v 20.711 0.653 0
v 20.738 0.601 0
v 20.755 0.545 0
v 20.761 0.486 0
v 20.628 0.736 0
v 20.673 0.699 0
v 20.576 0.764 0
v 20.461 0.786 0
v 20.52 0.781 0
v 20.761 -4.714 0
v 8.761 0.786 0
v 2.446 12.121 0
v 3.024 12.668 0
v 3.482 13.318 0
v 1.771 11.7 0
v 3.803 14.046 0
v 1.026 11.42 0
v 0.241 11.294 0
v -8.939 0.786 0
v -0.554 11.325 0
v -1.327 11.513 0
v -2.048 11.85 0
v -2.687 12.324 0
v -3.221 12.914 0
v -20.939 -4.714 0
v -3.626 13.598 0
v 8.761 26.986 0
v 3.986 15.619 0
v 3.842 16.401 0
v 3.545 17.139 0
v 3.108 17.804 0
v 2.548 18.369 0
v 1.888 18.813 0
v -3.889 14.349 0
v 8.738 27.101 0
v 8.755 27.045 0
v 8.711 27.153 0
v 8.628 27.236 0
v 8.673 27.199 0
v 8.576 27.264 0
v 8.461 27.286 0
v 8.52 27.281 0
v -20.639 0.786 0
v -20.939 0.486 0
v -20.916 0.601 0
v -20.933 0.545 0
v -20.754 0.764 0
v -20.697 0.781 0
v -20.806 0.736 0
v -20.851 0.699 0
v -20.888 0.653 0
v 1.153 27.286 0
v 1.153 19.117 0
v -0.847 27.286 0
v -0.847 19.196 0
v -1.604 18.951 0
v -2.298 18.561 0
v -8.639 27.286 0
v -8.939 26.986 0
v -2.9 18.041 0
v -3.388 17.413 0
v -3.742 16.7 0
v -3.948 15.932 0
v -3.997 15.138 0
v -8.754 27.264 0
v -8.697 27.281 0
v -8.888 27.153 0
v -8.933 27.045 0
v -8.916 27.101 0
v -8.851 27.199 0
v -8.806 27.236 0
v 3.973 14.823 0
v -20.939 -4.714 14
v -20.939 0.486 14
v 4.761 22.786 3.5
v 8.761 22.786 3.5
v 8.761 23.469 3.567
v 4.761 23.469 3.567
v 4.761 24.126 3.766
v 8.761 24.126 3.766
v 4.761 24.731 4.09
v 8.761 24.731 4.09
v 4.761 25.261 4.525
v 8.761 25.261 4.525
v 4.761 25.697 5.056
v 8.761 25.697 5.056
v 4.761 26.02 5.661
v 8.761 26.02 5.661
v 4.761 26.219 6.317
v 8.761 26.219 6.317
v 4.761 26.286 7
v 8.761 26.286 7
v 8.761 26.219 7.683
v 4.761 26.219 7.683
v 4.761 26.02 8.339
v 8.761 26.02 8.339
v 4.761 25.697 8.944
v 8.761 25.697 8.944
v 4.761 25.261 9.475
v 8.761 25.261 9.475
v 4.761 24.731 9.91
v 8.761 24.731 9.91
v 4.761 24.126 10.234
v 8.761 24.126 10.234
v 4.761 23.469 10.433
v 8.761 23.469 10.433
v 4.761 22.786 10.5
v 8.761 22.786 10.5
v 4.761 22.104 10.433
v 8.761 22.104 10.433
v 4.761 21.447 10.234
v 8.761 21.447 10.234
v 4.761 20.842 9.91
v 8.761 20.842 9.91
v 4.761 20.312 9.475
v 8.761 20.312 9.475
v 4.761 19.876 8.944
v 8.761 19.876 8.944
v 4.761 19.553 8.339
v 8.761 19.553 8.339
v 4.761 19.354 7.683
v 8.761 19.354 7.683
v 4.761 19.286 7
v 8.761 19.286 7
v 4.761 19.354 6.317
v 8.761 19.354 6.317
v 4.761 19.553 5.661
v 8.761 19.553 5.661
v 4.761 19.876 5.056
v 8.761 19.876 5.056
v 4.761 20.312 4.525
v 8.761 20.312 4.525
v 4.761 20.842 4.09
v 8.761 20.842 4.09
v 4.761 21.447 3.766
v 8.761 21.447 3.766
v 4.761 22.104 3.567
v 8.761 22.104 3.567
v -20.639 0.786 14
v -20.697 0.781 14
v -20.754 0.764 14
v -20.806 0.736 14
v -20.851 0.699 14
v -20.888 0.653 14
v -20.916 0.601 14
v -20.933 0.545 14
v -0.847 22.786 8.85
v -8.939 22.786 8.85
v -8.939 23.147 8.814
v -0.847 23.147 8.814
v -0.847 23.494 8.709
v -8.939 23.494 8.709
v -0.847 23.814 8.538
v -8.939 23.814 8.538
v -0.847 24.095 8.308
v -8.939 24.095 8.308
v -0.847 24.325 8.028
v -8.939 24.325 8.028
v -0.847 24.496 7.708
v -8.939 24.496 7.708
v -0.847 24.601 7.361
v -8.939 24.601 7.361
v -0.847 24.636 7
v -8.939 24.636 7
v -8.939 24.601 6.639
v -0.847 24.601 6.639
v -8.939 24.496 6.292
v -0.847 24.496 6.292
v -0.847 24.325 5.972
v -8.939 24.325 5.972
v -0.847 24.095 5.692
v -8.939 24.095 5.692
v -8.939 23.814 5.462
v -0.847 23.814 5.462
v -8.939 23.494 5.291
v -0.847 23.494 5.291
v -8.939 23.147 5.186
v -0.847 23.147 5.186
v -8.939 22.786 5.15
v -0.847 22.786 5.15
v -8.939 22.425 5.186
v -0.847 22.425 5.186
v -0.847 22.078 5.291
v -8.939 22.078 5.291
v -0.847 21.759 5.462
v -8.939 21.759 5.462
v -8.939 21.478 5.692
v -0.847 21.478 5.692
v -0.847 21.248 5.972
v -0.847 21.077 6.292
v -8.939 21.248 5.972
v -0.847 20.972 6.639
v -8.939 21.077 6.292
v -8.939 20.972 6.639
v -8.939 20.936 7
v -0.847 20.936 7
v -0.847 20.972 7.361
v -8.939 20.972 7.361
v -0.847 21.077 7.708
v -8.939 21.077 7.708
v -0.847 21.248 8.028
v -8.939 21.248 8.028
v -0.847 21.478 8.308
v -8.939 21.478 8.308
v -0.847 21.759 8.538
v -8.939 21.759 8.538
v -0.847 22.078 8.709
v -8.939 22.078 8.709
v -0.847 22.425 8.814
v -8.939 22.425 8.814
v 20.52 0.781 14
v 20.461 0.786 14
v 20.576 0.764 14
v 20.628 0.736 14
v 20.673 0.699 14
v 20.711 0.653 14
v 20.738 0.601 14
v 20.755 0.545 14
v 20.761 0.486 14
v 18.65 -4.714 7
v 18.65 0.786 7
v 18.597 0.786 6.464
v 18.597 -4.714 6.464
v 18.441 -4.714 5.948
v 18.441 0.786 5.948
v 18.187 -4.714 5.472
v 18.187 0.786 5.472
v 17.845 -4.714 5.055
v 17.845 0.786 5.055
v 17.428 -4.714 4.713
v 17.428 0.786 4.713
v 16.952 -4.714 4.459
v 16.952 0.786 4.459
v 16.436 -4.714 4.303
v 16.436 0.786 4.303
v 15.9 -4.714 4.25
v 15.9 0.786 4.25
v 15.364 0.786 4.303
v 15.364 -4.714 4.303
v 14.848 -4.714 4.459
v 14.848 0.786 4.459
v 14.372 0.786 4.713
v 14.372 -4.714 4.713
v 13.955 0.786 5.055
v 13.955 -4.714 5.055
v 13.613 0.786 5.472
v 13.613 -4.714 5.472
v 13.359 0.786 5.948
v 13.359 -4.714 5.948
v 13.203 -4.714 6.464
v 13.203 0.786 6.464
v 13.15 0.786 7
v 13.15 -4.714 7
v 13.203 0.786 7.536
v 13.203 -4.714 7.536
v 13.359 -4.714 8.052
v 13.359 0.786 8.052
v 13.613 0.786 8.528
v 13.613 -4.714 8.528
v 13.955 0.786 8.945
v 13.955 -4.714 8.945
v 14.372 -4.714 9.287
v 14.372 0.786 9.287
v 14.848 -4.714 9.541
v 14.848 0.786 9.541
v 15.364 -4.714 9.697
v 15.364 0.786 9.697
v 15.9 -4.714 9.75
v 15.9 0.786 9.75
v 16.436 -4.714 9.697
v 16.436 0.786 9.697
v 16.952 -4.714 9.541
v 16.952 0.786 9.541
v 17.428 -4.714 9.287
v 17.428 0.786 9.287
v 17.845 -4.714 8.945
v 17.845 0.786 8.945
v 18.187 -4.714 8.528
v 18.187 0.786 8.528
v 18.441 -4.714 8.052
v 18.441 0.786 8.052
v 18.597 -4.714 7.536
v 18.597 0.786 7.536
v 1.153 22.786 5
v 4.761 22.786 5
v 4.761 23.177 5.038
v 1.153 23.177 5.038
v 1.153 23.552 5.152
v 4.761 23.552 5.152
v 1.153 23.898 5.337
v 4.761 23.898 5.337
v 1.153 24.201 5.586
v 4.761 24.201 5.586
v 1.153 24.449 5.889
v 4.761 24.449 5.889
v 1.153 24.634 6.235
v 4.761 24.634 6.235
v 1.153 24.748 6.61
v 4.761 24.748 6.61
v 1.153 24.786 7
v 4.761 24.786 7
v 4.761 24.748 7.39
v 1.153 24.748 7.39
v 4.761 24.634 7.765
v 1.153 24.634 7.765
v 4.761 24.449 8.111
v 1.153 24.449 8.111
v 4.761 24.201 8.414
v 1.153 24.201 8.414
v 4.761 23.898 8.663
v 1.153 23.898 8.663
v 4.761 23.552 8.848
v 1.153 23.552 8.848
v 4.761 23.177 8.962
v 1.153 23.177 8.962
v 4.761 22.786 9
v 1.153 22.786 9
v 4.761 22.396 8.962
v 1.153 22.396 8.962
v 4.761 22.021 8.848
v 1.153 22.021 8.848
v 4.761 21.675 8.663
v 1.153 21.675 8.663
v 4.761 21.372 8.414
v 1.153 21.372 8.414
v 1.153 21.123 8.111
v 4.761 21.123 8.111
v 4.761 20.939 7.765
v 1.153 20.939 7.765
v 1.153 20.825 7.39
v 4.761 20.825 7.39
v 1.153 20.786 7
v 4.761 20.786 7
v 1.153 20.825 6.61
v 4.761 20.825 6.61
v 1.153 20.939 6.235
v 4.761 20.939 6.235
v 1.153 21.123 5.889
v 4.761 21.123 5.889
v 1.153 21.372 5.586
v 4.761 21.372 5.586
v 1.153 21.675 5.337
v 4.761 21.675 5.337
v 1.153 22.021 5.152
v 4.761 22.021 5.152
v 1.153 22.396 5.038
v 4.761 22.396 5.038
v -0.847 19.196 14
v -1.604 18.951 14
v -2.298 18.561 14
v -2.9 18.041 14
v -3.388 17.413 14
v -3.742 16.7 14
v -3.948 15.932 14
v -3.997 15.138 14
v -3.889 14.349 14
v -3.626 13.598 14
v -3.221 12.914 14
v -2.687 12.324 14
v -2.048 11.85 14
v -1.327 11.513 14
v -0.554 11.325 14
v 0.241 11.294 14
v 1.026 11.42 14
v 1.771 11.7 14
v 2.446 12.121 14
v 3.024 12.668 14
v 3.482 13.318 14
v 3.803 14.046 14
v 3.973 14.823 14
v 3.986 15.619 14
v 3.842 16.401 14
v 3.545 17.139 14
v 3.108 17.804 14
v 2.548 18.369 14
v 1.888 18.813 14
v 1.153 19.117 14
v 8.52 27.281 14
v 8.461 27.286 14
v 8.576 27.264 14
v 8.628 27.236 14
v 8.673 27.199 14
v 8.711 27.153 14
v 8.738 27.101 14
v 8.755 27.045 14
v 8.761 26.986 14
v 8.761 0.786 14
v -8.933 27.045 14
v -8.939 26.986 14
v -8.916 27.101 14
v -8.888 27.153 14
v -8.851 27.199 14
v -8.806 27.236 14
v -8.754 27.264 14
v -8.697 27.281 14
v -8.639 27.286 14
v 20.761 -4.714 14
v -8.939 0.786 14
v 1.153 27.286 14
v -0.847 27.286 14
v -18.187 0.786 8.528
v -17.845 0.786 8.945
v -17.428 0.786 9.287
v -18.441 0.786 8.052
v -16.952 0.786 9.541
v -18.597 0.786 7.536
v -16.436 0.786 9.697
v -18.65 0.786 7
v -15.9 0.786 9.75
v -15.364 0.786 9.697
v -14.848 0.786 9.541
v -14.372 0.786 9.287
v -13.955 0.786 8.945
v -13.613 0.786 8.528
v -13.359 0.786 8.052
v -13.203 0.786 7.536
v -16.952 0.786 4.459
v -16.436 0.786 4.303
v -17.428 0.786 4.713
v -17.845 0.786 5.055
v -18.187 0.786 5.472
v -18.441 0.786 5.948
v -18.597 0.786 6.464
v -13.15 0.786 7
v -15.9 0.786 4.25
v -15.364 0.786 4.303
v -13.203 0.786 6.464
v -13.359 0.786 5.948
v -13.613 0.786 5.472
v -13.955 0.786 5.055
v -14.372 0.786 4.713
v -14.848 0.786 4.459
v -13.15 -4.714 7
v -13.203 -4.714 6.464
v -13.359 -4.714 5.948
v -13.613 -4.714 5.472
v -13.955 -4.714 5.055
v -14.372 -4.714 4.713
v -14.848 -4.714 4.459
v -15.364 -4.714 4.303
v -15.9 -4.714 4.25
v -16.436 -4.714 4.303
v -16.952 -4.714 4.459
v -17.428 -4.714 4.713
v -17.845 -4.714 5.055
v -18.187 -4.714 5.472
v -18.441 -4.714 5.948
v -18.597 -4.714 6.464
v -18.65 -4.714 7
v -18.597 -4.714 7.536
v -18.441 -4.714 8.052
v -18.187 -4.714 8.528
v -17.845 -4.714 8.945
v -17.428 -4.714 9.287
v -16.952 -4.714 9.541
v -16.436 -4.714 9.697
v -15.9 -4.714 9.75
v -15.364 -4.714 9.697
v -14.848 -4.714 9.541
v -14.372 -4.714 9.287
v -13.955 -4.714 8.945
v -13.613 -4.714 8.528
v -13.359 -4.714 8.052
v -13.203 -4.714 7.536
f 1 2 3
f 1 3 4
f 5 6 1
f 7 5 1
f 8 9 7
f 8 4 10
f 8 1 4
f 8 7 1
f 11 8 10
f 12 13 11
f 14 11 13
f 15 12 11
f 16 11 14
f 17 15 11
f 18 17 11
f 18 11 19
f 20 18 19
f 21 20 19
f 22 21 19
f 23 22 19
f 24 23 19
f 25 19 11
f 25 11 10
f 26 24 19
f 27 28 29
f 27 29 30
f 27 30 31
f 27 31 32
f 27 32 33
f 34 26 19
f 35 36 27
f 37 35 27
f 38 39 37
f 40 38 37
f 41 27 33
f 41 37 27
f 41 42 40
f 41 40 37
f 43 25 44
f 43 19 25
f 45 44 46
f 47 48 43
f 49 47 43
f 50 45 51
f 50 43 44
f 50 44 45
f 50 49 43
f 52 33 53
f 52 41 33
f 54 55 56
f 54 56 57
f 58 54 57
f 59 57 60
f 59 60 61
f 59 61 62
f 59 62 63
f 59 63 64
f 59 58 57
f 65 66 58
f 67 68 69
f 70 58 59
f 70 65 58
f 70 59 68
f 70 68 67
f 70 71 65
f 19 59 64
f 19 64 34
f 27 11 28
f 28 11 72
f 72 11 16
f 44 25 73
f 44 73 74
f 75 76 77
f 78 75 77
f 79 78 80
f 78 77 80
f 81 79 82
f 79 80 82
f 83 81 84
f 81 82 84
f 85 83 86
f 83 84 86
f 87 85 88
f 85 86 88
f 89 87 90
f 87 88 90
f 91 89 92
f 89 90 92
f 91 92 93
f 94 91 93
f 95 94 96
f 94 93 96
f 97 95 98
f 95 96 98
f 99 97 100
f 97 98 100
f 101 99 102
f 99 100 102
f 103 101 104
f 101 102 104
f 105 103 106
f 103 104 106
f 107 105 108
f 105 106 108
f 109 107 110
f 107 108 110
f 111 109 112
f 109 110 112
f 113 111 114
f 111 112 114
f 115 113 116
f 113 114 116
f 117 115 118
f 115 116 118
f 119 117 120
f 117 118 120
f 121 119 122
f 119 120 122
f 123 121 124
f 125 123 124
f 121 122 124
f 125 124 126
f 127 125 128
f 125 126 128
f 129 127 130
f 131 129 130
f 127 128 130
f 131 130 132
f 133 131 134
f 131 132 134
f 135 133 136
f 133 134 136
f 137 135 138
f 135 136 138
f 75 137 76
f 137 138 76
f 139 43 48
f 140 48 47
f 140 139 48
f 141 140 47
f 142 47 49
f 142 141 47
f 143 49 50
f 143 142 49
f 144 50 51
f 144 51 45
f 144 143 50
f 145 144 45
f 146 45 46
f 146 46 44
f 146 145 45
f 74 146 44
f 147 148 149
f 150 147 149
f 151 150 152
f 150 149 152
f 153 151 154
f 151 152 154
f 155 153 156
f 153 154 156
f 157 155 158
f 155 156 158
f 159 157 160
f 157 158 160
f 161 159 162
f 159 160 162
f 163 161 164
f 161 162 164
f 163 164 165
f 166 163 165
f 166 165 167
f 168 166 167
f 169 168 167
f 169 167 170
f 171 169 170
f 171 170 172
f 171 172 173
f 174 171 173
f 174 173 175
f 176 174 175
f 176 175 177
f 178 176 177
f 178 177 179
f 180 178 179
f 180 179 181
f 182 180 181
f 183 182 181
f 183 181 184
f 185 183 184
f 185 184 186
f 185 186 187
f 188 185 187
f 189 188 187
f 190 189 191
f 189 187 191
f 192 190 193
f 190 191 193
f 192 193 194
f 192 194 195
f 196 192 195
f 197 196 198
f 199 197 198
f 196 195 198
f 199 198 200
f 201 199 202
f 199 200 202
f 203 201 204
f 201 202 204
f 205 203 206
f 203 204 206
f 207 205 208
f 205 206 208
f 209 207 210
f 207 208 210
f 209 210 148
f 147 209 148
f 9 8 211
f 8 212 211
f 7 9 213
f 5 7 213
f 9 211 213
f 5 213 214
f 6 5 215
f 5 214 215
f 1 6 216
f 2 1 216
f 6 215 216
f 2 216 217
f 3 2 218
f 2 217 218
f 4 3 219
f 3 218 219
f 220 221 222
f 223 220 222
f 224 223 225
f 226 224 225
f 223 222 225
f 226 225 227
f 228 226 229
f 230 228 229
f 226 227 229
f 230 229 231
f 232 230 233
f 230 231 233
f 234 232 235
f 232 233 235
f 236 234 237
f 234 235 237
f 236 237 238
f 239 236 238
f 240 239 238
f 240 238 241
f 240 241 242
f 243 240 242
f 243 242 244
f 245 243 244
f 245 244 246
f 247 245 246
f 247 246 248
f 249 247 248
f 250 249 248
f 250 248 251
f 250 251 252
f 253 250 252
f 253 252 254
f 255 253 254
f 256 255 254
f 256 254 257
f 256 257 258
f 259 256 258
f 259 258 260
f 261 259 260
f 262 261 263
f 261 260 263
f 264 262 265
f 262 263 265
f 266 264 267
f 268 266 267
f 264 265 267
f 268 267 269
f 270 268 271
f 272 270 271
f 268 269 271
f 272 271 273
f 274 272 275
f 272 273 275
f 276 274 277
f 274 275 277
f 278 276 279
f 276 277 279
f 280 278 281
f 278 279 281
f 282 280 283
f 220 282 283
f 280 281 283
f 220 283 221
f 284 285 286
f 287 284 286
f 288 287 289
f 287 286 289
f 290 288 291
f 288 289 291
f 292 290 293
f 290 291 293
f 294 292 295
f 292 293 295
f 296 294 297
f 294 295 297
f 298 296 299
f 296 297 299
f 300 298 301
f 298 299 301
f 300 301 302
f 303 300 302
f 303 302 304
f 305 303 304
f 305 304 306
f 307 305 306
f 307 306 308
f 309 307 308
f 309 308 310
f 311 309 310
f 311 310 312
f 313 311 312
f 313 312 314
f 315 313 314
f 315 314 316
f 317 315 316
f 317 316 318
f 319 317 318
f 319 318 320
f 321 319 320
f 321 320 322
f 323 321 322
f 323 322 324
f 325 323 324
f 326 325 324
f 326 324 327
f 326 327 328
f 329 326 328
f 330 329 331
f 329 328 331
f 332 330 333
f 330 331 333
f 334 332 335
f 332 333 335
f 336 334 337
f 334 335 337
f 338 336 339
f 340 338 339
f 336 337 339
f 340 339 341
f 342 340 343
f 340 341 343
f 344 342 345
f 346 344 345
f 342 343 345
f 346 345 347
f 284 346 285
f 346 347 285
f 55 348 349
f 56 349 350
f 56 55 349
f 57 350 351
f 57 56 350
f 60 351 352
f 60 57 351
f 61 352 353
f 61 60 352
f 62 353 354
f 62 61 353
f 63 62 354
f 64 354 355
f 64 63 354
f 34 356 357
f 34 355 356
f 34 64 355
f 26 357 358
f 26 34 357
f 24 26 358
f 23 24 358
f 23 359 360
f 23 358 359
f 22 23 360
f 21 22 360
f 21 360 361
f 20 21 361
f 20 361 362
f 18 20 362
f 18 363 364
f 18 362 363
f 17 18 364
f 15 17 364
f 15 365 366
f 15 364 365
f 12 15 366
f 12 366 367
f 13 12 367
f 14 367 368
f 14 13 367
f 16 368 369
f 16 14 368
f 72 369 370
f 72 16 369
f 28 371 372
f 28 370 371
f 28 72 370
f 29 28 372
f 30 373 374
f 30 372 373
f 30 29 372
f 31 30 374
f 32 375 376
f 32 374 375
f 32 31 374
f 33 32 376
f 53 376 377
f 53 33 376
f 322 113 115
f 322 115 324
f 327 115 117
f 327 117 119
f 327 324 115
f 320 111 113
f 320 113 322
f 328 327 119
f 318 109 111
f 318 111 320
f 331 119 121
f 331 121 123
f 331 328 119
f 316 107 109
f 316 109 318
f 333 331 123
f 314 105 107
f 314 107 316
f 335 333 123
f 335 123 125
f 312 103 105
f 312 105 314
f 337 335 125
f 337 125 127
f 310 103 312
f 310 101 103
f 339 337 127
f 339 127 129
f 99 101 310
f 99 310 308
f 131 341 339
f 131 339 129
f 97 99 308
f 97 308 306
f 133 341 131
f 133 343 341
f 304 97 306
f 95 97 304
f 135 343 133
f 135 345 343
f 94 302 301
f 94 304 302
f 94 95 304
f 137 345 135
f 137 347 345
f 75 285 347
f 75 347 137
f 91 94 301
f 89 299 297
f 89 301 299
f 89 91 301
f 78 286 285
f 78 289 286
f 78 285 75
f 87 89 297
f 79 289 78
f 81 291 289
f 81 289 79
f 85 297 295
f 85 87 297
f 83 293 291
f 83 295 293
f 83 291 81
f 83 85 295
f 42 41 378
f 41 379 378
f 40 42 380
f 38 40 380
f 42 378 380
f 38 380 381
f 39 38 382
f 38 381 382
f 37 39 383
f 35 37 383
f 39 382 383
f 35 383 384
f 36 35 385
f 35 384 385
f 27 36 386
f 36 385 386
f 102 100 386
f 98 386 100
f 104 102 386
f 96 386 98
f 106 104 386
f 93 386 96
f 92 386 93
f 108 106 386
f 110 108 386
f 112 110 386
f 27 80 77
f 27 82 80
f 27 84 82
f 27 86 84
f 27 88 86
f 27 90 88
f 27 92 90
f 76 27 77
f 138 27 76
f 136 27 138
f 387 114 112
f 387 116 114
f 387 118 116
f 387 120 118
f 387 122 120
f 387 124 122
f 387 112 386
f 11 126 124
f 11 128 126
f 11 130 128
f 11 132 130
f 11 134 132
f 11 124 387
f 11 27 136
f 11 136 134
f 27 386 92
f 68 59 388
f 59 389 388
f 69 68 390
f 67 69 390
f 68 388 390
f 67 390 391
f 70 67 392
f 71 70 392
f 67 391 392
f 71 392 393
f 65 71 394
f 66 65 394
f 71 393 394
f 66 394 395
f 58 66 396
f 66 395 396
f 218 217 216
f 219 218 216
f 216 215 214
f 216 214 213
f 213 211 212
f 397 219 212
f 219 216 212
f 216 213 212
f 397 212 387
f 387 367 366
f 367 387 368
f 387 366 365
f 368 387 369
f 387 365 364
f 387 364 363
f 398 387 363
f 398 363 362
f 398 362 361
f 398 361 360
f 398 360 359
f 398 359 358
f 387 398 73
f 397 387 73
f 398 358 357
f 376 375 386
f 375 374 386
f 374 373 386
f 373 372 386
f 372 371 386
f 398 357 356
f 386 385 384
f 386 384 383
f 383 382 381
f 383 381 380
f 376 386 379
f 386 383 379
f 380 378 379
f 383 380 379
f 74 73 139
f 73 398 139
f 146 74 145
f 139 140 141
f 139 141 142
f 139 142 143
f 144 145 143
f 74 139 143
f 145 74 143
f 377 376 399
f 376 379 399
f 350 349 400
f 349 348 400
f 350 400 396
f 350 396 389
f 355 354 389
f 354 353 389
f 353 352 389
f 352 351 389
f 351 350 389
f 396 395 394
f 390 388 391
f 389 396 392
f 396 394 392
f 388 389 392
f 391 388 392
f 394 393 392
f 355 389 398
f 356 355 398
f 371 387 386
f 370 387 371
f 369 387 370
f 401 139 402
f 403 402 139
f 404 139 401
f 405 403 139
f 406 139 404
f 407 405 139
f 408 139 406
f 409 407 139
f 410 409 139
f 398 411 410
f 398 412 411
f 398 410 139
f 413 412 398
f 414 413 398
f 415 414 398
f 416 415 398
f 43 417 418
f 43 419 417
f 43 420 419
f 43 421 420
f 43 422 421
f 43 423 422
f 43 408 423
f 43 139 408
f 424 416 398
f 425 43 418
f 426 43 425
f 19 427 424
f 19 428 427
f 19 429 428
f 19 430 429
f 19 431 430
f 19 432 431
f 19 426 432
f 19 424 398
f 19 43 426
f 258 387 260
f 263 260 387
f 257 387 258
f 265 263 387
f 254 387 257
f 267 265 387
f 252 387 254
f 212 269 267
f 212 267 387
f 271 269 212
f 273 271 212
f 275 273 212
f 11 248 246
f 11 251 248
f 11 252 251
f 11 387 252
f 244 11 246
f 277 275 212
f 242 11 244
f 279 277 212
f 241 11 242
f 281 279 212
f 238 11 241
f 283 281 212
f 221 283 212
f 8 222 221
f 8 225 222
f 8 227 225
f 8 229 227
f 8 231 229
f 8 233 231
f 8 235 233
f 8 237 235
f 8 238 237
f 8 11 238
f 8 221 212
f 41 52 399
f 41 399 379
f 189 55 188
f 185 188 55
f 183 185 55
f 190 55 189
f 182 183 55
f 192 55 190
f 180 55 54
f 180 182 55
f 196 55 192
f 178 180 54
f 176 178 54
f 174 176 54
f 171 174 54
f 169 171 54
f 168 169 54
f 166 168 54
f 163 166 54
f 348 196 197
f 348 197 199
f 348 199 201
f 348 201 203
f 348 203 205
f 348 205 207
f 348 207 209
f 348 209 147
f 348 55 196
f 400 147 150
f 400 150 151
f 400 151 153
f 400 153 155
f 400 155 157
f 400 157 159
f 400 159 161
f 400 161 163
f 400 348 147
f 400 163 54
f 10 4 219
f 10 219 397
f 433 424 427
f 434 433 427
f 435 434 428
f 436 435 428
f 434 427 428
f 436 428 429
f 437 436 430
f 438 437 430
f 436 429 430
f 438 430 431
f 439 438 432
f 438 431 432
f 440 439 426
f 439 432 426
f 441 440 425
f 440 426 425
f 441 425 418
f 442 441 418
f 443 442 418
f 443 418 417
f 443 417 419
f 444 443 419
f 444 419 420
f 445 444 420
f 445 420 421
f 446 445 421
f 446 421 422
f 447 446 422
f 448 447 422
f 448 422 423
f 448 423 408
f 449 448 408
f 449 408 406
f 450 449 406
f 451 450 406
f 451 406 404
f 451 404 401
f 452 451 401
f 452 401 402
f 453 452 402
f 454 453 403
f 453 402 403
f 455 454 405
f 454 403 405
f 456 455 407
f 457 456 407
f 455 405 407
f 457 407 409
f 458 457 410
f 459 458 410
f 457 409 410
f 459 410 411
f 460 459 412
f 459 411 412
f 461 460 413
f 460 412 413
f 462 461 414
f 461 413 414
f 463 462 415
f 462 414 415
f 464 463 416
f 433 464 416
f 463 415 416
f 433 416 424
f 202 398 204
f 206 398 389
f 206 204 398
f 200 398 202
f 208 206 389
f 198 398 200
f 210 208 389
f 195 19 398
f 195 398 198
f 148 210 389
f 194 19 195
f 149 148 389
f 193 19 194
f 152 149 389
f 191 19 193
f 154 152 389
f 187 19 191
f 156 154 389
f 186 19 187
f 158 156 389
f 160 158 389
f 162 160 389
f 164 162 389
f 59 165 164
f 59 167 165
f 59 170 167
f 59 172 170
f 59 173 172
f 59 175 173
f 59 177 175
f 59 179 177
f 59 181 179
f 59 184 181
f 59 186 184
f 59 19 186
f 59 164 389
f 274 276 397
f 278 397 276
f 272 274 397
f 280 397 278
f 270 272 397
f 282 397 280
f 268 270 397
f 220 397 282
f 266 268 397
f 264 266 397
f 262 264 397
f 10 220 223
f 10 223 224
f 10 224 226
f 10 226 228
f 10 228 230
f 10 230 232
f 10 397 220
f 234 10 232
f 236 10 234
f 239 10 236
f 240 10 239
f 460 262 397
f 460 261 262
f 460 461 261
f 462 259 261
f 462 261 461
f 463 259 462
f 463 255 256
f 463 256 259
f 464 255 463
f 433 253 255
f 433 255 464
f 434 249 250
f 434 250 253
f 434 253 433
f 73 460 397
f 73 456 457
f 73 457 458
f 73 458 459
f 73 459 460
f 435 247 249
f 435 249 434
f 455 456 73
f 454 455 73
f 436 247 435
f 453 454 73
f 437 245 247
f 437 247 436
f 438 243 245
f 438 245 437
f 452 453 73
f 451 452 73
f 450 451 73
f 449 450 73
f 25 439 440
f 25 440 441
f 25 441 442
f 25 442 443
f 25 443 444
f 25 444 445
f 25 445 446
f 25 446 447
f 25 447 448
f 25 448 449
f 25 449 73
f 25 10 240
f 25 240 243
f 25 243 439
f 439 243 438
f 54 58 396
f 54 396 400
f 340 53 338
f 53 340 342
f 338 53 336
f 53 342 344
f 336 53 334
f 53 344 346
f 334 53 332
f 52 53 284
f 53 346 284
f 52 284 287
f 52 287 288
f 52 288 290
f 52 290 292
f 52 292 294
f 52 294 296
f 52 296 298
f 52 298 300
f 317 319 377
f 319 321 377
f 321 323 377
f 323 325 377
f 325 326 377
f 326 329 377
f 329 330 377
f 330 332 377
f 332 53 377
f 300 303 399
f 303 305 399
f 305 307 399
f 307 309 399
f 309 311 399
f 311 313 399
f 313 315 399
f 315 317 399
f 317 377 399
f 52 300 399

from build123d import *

# Parameters (mm, degrees)
SKETCH1_R           = 4
BOSS_EXTRUDE1_DEPTH = 14
SKETCH2_R           = 2.75
CUT_EXTRUDE1_DEPTH  = 6
SKETCH3_W           = 2
SKETCH3_H           = 11.620769134
CUT_EXTRUDE2_DEPTH  = 14
SKETCH4_R           = 2
CUT_EXTRUDE3_DEPTH  = 9
SKETCH5_R           = 3.5
CUT_EXTRUDE4_DEPTH  = 4
SKETCH6_R           = 1.85
CUT_EXTRUDE5_DEPTH  = 9
FILLET1_R           = 0.3


with BuildPart() as part:
    # Sketch1 → Boss-Extrude1 (new body)
    with BuildSketch(Plane.XY):
        Polygon((-20.938905162, 0.786403392), (-8.938905162, 0.786403392), (-8.938905162, 27.286403392), (8.761094838, 27.286403392), (8.761094838, 0.786403392), (20.761094838, 0.786403392), (20.761094838, -4.713596608), (-20.938905162, -4.713596608), align=None)
        with Locations((0, 15.286403392)):
            Circle(SKETCH1_R, mode=Mode.SUBTRACT)
    extrude(amount=BOSS_EXTRUDE1_DEPTH)

    # Sketch2 → Cut-Extrude1 (cut)
    with BuildSketch(Plane(origin=(0, 0.786403392, 0), x_dir=(1, 0, 0), z_dir=(0, 1, 0))):
        with Locations((-15.9, -7)):
            Circle(SKETCH2_R)
        with Locations((15.9, -7)):
            Circle(SKETCH2_R)
    extrude(amount=-CUT_EXTRUDE1_DEPTH, mode=Mode.SUBTRACT)

    # Sketch3 → Cut-Extrude2 (cut)
    with BuildSketch(Plane.XY.offset(14)):
        with Locations((0.152630001, 23.872597077)):
            Rectangle(SKETCH3_W, SKETCH3_H)
    extrude(amount=-CUT_EXTRUDE2_DEPTH, mode=Mode.SUBTRACT)

    # Sketch4 → Cut-Extrude3 (cut)
    with BuildSketch(Plane(origin=(8.761094838, 0, 0), x_dir=(0, 0, -1), z_dir=(1, 0, 0))):
        with Locations((-7, 22.786403392)):
            Circle(SKETCH4_R)
    extrude(amount=-CUT_EXTRUDE3_DEPTH, mode=Mode.SUBTRACT)

    # Sketch5 → Cut-Extrude4 (cut)
    with BuildSketch(Plane(origin=(8.761094838, 0, 0), x_dir=(0, 0, -1), z_dir=(1, 0, 0))):
        with Locations((-7, 22.786403392)):
            Circle(SKETCH5_R)
    extrude(amount=-CUT_EXTRUDE4_DEPTH, mode=Mode.SUBTRACT)

    # Sketch6 → Cut-Extrude5 (cut)
    with BuildSketch(Plane.ZY.offset(8.938905162)):
        with Locations((7, 22.786403392)):
            Circle(SKETCH6_R)
    extrude(amount=-CUT_EXTRUDE5_DEPTH, mode=Mode.SUBTRACT)

    # Fillet1
    fillet1_edges = [part.edges().sort_by_distance(p)[0] for p in [
        (-20.938905162, 0.786403392, 7),
        (-8.938905162, 27.286403392, 7),
        (8.761094838, 27.286403392, 7),
        (20.761094838, 0.786403392, 7),
    ]]
    fillet(fillet1_edges, radius=FILLET1_R)


solid = part.part
